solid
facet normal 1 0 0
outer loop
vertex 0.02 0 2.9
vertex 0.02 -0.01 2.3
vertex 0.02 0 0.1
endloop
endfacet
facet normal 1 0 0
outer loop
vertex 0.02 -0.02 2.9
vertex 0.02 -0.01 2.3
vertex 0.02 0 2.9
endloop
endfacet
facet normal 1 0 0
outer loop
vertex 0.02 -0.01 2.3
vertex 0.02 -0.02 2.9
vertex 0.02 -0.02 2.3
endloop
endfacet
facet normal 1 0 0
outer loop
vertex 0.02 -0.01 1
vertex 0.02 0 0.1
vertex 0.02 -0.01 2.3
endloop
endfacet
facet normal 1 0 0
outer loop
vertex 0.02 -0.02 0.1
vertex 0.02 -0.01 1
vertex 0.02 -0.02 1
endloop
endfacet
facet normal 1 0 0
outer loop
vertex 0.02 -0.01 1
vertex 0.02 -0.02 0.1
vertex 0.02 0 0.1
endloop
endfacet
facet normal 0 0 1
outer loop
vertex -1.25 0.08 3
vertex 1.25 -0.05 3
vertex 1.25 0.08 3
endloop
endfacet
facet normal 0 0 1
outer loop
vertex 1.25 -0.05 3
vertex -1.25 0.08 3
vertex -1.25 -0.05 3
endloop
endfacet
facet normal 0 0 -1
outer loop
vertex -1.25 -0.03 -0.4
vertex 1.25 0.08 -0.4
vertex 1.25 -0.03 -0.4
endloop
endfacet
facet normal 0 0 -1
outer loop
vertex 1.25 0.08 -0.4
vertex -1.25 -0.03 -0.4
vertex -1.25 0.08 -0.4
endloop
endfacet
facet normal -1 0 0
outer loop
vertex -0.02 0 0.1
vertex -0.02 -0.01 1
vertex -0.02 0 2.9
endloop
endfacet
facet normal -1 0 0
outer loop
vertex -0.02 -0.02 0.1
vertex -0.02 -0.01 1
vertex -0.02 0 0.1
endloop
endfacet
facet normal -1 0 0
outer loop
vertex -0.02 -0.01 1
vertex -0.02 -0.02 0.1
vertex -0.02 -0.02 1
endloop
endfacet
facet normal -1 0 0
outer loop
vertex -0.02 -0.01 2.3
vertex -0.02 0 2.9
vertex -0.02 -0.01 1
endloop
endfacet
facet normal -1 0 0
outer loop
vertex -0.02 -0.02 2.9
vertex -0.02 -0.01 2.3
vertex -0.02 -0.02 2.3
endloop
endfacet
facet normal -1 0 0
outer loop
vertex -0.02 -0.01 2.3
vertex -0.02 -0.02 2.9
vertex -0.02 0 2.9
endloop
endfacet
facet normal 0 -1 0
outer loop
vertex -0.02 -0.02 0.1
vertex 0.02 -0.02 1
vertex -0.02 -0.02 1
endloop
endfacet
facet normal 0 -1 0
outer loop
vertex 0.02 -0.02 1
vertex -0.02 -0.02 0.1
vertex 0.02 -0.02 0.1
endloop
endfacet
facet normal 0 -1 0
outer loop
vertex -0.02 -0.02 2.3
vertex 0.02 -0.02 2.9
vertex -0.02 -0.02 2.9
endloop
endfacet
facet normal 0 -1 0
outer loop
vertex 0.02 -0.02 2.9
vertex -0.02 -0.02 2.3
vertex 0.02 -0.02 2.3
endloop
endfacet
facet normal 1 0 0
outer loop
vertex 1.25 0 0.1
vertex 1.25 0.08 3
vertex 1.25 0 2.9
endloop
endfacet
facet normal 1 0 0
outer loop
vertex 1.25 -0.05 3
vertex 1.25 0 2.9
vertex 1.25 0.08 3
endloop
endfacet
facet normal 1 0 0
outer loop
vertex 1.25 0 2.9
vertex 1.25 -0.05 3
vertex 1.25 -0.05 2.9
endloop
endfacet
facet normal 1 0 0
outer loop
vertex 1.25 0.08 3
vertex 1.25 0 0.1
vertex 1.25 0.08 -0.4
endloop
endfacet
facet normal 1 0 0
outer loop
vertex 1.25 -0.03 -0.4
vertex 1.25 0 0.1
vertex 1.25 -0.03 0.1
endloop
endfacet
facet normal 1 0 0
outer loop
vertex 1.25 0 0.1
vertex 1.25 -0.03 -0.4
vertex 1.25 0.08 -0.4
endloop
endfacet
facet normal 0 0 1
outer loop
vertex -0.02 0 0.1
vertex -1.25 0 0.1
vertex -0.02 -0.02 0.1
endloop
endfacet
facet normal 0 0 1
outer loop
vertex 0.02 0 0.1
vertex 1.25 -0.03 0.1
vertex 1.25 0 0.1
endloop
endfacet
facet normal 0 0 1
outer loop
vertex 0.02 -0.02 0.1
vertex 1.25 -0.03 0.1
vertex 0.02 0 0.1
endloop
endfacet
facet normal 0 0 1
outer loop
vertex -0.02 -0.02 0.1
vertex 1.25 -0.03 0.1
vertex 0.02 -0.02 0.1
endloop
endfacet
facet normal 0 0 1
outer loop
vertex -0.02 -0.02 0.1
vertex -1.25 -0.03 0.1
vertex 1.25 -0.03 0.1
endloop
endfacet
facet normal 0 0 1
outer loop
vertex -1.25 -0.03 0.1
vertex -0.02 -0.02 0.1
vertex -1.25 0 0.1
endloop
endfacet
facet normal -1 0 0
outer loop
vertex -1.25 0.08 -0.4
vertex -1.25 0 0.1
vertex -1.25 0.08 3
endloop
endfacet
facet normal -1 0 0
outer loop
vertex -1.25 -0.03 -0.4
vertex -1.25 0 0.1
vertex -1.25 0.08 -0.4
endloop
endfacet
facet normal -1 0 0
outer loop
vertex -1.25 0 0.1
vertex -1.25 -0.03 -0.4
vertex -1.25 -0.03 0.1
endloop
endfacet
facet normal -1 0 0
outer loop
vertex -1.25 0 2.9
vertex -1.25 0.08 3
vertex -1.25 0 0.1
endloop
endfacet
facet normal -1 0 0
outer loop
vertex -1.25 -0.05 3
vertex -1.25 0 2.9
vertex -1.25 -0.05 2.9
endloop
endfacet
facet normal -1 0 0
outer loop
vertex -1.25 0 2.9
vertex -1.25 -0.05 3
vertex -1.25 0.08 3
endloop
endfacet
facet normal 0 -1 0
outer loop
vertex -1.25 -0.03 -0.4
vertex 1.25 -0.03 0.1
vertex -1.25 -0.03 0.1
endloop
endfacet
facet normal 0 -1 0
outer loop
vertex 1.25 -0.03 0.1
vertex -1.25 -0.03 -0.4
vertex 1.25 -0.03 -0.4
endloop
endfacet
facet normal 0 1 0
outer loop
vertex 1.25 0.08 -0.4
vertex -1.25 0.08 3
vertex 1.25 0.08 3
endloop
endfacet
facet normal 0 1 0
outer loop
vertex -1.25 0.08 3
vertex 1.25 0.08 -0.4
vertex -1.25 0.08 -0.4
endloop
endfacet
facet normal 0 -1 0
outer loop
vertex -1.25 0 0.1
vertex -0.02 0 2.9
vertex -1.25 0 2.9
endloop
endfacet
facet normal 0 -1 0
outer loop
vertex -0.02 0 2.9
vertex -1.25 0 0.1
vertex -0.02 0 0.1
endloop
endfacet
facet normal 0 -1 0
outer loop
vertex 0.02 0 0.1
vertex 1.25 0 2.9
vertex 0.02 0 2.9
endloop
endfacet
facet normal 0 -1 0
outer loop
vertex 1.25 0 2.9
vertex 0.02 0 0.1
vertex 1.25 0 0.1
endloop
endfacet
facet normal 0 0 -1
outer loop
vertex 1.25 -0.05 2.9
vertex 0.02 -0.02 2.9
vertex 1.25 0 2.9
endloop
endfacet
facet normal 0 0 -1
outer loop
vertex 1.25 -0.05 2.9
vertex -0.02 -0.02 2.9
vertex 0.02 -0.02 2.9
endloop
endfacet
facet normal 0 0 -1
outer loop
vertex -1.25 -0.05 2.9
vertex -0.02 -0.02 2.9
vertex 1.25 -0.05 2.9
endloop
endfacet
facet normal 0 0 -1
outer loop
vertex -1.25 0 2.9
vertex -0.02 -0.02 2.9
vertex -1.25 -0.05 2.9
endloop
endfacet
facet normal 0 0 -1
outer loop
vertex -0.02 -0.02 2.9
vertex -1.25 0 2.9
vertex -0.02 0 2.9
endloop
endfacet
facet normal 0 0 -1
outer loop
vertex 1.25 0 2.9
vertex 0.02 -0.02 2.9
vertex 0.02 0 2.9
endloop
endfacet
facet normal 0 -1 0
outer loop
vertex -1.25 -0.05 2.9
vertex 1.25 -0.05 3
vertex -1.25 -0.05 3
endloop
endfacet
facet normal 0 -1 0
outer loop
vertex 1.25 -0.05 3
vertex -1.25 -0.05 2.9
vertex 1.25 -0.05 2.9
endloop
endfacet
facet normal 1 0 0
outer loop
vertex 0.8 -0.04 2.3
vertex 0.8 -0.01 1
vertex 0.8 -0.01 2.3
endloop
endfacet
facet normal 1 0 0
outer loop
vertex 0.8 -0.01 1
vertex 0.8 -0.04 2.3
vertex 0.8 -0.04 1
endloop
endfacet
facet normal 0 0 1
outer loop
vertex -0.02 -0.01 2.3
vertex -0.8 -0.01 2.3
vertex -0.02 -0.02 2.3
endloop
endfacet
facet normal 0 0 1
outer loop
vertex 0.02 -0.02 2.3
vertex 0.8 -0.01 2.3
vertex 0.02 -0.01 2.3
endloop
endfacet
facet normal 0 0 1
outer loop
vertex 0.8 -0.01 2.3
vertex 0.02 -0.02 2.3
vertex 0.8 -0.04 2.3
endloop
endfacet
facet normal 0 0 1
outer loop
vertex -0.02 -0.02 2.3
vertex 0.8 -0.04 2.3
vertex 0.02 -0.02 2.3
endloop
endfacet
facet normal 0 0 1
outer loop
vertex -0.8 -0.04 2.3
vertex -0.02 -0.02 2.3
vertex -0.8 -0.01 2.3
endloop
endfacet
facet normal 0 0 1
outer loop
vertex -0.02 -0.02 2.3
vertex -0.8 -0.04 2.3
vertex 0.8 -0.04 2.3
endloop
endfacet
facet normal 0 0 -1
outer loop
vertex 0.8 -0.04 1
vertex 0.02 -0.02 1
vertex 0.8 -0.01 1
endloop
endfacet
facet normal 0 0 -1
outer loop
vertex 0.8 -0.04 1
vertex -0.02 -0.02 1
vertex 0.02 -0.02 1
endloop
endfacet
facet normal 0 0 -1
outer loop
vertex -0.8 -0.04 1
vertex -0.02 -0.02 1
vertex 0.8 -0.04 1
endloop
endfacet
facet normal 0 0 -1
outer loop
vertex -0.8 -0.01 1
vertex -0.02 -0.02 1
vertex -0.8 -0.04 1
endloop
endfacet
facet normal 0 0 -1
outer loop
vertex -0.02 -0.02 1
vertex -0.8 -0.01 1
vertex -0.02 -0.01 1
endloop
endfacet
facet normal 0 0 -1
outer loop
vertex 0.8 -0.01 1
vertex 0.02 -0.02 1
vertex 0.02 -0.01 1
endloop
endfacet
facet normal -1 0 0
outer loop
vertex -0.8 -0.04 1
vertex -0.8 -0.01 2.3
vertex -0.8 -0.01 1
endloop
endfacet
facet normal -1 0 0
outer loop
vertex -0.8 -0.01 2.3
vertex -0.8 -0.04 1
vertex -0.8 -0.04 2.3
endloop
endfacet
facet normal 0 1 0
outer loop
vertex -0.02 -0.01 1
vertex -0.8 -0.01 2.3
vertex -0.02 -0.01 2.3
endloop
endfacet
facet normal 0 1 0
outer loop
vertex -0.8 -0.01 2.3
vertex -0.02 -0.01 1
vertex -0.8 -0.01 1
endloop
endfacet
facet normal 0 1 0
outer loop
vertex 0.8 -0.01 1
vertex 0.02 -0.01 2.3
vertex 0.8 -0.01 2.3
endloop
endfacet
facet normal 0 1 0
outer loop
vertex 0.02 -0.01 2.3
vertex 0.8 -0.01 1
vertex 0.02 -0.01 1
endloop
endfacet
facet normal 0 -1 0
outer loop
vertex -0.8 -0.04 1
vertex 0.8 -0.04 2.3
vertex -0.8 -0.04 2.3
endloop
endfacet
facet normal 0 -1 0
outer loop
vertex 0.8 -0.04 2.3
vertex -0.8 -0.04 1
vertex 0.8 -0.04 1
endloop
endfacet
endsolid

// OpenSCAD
// Tent shell kit: wall window. See lib/lodge_kit.scad.
include <lib/lodge_kit.scad>
kind = "tent";
wall_window();
